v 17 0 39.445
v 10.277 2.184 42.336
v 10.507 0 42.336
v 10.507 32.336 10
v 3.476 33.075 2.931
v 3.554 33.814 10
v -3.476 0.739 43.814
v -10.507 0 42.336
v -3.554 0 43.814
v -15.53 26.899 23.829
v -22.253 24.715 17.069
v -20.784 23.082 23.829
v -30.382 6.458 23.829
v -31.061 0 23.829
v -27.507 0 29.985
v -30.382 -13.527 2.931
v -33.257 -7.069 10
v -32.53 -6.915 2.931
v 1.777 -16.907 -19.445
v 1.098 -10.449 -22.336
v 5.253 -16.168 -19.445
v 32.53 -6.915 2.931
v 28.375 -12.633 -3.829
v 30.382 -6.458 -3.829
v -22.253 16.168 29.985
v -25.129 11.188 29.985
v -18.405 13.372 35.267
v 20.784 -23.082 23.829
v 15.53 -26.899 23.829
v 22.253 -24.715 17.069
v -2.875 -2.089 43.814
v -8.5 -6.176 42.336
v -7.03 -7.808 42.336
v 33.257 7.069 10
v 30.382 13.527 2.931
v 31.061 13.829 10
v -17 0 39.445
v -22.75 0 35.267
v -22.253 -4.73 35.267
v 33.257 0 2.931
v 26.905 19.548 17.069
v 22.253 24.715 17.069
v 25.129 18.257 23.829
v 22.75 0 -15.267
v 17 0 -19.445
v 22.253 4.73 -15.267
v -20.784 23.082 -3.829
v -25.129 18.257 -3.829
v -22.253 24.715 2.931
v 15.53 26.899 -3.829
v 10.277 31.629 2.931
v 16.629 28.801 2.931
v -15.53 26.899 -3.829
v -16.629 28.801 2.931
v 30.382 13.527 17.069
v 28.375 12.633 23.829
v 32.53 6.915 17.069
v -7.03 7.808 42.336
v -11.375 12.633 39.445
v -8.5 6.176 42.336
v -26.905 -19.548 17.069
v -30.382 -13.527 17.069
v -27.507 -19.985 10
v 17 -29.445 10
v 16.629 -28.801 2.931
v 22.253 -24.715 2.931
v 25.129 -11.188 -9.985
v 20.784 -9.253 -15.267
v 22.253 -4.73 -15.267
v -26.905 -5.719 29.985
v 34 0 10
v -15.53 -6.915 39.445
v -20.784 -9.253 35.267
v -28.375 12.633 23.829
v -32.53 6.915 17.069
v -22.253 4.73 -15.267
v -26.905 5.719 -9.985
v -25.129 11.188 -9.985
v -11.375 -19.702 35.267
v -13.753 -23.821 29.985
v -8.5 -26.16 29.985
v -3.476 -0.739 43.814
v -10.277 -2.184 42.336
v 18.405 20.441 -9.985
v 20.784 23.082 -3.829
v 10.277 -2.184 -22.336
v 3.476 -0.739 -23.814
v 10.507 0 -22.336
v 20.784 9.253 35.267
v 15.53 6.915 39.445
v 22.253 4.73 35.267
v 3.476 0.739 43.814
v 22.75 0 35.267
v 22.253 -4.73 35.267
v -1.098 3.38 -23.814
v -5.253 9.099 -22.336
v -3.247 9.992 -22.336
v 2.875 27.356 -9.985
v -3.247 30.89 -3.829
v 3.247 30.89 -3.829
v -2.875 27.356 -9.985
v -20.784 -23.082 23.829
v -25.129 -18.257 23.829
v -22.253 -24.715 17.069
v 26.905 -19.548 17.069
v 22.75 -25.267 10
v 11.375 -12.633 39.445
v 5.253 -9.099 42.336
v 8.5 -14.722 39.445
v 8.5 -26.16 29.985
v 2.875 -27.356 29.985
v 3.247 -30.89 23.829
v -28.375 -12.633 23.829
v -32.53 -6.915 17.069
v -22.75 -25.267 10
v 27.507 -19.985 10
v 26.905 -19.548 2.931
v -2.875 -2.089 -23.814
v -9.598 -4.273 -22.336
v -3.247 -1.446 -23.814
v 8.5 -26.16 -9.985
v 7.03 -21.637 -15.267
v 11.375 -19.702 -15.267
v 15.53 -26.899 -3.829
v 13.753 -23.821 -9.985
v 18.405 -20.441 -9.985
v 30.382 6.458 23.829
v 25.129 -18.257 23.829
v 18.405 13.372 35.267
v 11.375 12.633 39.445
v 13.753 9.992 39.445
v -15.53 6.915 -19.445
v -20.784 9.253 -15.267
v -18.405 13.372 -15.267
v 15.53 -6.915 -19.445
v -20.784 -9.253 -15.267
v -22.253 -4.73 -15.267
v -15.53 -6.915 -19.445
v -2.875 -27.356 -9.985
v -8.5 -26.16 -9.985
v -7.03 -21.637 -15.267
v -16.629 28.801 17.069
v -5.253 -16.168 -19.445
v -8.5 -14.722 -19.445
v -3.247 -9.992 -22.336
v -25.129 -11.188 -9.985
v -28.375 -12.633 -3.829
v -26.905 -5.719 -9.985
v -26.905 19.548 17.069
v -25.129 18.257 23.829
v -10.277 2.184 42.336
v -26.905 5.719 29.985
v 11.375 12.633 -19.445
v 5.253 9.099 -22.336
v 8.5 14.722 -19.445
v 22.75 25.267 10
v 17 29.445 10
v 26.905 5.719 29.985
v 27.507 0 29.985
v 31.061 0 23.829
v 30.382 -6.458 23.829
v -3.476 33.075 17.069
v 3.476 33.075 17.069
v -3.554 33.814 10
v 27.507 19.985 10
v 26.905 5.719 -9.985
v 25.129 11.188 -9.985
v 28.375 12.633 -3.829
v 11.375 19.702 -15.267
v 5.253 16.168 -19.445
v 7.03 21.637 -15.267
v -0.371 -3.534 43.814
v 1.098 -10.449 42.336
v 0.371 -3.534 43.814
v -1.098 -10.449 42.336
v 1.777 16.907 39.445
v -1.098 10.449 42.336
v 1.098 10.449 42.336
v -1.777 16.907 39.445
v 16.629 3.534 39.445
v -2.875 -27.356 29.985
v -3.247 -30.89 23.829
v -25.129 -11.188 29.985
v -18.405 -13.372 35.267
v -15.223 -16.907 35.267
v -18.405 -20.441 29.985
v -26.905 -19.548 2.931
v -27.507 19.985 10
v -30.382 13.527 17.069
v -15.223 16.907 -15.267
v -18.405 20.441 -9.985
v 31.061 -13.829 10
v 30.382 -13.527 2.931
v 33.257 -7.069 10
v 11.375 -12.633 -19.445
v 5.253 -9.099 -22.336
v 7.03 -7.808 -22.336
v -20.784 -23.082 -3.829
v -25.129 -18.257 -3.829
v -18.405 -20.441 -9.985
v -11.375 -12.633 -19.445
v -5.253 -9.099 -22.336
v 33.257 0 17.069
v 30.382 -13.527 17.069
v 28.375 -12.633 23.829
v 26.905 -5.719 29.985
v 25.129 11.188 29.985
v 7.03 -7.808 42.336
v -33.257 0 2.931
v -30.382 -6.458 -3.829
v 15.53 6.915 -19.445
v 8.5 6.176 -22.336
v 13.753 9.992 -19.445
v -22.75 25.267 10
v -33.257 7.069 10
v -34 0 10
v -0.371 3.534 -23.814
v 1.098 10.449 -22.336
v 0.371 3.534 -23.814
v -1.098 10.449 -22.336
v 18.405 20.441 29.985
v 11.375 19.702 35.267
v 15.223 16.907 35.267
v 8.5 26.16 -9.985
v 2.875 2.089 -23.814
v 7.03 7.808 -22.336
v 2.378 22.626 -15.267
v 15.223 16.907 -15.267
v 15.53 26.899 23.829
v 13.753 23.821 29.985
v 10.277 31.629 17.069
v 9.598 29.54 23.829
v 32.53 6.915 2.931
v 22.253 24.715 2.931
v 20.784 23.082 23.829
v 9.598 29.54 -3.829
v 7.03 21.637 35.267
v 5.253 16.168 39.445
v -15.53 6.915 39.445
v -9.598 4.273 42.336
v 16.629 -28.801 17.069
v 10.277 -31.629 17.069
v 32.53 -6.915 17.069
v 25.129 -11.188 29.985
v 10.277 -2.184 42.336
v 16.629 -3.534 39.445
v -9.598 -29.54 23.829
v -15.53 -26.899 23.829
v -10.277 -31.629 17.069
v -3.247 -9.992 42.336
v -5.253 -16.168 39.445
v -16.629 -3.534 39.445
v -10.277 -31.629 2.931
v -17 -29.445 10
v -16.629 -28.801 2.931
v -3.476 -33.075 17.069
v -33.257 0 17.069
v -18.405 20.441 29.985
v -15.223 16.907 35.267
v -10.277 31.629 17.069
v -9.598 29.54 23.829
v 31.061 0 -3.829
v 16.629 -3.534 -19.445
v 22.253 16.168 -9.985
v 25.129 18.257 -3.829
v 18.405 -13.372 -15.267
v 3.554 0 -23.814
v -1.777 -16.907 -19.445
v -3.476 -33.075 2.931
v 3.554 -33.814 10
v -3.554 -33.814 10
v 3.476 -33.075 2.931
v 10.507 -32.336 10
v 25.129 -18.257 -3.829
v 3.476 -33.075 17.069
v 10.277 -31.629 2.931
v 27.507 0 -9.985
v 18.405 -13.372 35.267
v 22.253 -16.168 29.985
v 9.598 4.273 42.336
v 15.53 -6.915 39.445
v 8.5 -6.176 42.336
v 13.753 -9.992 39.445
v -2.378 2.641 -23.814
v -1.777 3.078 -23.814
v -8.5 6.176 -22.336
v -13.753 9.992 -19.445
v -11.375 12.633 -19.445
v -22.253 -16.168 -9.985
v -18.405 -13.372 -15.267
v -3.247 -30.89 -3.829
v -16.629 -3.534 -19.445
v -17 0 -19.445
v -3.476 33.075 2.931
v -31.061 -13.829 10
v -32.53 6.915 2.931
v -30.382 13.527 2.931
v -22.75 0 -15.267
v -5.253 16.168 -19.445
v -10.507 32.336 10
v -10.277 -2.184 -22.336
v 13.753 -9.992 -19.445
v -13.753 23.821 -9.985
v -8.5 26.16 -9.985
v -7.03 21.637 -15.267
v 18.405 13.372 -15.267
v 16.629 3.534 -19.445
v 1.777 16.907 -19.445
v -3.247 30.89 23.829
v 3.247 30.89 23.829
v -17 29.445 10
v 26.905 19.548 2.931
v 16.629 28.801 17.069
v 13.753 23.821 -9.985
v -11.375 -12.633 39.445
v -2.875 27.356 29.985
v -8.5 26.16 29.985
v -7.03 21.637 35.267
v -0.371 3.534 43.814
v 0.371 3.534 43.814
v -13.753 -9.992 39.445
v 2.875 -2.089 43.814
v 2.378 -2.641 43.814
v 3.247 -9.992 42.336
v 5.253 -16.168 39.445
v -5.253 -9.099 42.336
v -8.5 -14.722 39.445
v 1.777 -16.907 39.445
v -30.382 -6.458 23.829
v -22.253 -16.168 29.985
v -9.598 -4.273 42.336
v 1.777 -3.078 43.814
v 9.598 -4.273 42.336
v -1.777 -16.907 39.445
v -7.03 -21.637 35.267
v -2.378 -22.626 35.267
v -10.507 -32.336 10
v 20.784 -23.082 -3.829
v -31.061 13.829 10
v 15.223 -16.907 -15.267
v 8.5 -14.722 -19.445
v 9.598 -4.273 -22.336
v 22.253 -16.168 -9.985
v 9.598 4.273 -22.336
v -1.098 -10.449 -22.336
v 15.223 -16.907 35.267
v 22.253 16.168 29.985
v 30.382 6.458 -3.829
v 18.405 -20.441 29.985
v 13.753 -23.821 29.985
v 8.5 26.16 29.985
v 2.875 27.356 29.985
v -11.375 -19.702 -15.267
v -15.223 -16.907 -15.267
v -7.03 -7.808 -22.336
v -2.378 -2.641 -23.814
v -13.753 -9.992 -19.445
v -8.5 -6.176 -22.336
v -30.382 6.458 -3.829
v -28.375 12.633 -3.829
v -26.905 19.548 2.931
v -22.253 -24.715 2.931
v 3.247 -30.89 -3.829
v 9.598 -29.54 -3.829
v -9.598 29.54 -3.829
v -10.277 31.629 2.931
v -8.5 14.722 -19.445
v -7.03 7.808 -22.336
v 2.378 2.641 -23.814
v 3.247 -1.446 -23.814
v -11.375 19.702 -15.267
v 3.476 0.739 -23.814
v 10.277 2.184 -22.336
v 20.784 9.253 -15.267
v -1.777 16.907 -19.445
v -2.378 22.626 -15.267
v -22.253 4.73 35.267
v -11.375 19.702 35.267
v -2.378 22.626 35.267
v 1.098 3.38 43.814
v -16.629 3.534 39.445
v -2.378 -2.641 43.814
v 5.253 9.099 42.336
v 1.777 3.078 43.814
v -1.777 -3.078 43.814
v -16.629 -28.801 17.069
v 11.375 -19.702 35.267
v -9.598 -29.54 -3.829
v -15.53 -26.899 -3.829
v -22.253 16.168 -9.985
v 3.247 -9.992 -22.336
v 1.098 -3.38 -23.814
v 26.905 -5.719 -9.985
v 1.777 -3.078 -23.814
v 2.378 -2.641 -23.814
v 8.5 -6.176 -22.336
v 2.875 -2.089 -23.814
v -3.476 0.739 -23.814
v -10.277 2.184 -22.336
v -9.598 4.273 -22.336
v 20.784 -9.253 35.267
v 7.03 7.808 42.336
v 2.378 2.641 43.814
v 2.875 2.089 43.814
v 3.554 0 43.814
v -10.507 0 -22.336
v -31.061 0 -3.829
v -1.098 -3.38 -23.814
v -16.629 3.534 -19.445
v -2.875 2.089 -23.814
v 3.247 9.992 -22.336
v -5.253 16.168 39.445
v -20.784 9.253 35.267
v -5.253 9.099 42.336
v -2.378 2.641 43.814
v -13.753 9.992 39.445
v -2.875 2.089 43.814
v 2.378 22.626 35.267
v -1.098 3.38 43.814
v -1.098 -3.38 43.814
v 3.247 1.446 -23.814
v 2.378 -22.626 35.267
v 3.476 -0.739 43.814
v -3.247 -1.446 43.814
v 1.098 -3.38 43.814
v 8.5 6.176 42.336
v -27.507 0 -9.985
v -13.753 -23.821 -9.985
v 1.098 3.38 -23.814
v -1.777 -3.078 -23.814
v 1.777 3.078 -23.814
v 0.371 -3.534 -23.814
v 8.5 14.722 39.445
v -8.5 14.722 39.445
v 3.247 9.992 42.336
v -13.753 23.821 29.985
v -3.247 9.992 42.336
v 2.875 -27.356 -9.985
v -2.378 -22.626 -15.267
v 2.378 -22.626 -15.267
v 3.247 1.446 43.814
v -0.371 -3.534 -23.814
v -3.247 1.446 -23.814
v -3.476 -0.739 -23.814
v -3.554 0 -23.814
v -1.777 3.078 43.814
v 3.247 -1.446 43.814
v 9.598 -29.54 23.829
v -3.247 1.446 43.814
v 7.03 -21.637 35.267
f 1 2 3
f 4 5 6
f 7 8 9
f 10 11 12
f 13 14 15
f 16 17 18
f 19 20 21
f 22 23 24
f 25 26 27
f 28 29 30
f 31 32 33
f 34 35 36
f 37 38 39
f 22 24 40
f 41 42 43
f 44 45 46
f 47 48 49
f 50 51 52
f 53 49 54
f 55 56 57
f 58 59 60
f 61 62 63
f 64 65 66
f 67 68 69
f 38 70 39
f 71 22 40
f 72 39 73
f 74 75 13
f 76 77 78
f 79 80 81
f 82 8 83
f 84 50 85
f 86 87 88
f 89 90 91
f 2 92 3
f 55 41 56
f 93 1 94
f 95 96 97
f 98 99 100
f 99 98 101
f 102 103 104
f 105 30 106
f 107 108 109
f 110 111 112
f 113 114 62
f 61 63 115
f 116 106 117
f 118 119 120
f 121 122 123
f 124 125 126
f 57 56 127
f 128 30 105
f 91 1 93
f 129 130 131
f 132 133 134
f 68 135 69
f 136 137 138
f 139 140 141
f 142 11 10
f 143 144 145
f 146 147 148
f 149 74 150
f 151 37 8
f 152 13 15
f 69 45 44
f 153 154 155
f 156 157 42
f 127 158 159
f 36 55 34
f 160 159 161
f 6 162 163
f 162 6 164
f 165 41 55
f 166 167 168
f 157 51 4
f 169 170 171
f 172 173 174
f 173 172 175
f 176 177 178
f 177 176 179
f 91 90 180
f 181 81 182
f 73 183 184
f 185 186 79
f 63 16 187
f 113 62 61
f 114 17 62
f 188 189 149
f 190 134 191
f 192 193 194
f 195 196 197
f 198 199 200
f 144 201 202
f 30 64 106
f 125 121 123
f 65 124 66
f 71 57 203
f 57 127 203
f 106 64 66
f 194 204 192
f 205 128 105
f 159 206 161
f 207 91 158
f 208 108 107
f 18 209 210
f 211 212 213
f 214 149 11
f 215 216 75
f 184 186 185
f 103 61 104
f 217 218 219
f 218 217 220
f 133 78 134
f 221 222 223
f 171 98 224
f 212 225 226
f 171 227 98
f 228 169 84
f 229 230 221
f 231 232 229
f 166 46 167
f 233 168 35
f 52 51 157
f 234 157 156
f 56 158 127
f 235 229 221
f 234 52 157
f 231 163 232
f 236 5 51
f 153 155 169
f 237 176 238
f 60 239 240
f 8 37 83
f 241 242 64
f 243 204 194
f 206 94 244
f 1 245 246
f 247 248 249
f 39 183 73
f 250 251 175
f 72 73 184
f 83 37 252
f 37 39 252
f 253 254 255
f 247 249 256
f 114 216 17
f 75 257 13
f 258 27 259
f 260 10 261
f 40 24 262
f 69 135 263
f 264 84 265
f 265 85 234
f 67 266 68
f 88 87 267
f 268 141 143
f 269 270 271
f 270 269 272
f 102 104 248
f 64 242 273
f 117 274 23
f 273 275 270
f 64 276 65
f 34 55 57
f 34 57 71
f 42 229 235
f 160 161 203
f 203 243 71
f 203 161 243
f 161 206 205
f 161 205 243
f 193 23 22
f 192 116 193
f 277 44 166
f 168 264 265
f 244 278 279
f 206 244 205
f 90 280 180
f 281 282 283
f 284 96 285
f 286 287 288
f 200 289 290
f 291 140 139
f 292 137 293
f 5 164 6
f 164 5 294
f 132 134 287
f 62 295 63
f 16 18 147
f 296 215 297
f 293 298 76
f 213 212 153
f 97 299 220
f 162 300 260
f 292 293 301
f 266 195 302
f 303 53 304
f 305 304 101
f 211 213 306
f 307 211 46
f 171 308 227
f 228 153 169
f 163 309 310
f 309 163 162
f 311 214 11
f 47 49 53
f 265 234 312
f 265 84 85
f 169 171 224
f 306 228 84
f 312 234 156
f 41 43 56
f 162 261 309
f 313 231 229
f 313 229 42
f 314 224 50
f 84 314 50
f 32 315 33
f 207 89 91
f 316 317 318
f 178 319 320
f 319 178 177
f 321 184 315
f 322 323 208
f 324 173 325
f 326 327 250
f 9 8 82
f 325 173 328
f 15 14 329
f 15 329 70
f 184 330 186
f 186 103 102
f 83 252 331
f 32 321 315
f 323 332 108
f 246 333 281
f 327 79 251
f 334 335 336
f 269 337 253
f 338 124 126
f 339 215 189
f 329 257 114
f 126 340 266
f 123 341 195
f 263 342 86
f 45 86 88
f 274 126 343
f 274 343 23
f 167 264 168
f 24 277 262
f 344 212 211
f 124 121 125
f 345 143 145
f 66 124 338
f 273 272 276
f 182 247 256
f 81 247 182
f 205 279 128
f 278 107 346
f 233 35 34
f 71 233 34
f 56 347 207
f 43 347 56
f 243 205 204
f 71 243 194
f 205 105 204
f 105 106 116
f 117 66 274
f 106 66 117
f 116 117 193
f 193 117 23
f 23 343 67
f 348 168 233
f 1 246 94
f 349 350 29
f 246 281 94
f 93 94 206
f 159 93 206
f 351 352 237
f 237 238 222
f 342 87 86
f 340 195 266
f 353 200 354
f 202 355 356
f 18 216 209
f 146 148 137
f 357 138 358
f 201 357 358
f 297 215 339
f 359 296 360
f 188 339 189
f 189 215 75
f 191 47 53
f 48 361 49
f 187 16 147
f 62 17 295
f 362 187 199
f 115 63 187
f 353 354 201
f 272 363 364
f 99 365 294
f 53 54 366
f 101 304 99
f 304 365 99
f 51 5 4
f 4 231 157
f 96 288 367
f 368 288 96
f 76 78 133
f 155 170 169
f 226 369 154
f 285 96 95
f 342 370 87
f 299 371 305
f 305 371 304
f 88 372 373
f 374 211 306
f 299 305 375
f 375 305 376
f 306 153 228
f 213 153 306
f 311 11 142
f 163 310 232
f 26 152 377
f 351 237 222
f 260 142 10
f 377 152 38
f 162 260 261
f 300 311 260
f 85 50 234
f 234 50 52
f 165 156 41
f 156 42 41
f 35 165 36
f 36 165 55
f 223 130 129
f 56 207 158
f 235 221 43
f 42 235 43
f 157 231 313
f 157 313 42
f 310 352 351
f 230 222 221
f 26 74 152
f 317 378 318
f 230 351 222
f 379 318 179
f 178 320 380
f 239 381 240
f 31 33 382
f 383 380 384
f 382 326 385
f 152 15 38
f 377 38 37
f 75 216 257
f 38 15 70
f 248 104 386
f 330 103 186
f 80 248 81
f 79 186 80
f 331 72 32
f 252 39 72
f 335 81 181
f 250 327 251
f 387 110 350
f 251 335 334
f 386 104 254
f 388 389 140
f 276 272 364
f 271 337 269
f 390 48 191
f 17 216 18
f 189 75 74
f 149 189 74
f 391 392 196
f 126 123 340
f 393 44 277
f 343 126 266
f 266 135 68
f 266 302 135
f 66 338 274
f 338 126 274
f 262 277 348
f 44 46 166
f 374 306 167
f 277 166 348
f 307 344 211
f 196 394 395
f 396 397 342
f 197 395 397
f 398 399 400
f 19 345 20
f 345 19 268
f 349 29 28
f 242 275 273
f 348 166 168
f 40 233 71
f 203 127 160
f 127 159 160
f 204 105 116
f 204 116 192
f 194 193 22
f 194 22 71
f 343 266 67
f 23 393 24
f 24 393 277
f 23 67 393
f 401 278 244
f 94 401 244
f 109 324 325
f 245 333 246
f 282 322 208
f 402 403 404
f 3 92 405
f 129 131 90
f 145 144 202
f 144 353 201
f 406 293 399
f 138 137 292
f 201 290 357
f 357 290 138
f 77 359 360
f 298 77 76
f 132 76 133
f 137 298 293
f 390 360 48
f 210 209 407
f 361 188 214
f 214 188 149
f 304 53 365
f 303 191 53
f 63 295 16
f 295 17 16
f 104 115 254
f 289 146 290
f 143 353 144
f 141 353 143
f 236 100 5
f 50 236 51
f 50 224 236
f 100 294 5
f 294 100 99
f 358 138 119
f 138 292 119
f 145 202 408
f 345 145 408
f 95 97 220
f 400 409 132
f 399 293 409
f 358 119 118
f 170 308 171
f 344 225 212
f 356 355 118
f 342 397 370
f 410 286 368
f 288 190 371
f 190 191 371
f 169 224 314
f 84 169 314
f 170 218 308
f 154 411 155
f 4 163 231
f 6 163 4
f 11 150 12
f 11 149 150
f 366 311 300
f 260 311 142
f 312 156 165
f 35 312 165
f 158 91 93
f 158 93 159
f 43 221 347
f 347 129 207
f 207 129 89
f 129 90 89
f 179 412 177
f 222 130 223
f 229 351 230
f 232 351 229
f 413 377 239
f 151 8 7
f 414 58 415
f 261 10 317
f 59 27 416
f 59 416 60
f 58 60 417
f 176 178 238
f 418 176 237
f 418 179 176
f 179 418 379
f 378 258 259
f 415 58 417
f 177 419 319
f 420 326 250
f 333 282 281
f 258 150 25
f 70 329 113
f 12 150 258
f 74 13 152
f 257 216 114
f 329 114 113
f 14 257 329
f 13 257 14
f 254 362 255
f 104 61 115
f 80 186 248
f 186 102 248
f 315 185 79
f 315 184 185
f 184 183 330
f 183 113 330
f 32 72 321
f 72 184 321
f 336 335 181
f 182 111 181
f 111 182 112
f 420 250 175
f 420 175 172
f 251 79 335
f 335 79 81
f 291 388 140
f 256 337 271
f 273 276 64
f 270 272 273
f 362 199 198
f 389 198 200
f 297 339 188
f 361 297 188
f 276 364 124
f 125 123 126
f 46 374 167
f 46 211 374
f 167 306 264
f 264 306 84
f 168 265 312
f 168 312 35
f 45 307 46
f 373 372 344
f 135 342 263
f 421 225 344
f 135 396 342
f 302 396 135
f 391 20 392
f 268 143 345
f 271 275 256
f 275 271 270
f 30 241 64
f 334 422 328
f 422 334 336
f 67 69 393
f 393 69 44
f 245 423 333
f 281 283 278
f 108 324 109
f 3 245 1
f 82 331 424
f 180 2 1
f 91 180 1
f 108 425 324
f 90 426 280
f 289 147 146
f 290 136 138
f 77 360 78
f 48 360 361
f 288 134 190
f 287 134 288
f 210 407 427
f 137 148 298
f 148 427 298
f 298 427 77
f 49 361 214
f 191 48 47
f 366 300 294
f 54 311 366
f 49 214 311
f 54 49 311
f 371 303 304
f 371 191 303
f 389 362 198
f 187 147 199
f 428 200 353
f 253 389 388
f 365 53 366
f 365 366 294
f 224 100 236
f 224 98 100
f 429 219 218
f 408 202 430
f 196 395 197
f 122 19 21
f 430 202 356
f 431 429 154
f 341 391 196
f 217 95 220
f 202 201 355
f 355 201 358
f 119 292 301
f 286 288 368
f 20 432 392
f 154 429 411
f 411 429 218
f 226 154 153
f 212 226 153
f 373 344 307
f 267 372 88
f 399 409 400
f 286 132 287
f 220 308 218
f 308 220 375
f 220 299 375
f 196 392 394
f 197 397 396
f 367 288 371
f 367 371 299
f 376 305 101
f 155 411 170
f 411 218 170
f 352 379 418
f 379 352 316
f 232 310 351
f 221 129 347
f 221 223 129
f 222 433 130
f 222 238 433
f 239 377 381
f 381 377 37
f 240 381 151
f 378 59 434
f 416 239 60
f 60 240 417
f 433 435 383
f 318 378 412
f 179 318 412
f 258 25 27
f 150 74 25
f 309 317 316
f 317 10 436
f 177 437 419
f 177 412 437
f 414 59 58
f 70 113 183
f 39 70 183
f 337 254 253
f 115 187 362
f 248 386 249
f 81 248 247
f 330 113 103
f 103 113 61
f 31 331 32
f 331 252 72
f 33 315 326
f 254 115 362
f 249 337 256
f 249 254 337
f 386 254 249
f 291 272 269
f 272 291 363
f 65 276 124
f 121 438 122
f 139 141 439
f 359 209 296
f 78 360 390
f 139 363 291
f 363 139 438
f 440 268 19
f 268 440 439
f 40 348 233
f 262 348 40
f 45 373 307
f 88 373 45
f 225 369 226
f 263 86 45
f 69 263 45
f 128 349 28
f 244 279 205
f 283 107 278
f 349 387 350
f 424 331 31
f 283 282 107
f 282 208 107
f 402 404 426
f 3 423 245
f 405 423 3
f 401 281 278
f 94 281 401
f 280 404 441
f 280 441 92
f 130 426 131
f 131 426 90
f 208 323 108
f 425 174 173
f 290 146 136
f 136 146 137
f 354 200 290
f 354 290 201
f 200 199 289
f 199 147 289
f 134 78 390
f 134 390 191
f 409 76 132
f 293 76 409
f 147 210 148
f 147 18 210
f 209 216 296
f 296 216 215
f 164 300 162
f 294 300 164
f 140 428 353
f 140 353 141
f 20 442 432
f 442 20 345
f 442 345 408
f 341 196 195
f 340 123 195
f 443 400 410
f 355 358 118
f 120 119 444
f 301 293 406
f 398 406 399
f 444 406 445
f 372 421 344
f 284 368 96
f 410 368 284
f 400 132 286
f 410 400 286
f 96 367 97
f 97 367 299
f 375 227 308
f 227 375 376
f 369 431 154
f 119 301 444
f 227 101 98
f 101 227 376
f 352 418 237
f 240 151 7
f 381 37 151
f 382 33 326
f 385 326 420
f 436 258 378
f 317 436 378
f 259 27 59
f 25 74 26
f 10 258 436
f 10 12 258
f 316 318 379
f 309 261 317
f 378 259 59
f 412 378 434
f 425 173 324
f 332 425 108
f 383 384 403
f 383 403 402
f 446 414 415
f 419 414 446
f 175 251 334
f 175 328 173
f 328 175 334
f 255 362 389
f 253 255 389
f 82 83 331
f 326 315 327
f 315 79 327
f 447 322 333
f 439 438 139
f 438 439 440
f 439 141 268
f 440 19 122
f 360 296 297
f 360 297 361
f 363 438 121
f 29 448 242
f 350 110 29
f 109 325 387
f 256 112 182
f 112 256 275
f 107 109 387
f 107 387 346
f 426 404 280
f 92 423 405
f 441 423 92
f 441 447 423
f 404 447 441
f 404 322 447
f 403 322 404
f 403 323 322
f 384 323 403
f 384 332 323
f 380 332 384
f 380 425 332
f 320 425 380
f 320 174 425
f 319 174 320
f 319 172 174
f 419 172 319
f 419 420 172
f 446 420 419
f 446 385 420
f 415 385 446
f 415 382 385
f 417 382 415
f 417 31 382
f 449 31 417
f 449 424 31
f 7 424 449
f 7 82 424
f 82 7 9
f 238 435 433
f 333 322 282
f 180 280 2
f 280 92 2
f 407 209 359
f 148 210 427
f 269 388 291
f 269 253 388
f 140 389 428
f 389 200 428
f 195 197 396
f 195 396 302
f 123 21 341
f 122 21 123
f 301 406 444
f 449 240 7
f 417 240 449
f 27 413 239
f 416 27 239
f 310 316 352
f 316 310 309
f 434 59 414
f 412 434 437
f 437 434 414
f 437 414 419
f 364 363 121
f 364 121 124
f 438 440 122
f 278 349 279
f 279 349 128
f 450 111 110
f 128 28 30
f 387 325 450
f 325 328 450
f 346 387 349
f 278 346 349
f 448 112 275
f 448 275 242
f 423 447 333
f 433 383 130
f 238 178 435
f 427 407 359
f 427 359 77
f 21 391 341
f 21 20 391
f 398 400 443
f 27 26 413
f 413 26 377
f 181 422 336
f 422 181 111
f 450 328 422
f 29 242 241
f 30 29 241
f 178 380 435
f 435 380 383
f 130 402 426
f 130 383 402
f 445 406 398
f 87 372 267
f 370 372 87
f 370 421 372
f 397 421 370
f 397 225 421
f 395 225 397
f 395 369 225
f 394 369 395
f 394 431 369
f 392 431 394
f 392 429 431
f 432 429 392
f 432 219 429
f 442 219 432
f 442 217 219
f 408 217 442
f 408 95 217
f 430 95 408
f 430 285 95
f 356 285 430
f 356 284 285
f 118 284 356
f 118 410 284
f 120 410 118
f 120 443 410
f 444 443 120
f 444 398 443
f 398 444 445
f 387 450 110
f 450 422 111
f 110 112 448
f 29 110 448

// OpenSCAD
/* [Drop down box:] */
// combo box for number
Numbers=2; // [0, 1, 2, 3]

// combo box for string
Strings="foo"; // [foo, bar, baz]

/* [Slider] */
// slider widget for number
slider =34; // [10:100]
cube_size =10; // [10:100]

//step slider for number
stepSlider=2; //[0:5:100]

/* [Checkbox] */
//description
Variable = true;

/* [Textbox] */
// Text box for string with length 8
String="length"; // [8]

/* [Special vector] */
Vector3=[12,34,46]; //[0:2:50]

/* [Hidden] */
debugMode = true;

module __Customizer_Limit__ () {}
shownAfterBrace = true;


cube([cube_size, cube_size, cube_size]);

if (Variable) {
    translate([0, 0, cube_size])
        sphere(slider);
}
